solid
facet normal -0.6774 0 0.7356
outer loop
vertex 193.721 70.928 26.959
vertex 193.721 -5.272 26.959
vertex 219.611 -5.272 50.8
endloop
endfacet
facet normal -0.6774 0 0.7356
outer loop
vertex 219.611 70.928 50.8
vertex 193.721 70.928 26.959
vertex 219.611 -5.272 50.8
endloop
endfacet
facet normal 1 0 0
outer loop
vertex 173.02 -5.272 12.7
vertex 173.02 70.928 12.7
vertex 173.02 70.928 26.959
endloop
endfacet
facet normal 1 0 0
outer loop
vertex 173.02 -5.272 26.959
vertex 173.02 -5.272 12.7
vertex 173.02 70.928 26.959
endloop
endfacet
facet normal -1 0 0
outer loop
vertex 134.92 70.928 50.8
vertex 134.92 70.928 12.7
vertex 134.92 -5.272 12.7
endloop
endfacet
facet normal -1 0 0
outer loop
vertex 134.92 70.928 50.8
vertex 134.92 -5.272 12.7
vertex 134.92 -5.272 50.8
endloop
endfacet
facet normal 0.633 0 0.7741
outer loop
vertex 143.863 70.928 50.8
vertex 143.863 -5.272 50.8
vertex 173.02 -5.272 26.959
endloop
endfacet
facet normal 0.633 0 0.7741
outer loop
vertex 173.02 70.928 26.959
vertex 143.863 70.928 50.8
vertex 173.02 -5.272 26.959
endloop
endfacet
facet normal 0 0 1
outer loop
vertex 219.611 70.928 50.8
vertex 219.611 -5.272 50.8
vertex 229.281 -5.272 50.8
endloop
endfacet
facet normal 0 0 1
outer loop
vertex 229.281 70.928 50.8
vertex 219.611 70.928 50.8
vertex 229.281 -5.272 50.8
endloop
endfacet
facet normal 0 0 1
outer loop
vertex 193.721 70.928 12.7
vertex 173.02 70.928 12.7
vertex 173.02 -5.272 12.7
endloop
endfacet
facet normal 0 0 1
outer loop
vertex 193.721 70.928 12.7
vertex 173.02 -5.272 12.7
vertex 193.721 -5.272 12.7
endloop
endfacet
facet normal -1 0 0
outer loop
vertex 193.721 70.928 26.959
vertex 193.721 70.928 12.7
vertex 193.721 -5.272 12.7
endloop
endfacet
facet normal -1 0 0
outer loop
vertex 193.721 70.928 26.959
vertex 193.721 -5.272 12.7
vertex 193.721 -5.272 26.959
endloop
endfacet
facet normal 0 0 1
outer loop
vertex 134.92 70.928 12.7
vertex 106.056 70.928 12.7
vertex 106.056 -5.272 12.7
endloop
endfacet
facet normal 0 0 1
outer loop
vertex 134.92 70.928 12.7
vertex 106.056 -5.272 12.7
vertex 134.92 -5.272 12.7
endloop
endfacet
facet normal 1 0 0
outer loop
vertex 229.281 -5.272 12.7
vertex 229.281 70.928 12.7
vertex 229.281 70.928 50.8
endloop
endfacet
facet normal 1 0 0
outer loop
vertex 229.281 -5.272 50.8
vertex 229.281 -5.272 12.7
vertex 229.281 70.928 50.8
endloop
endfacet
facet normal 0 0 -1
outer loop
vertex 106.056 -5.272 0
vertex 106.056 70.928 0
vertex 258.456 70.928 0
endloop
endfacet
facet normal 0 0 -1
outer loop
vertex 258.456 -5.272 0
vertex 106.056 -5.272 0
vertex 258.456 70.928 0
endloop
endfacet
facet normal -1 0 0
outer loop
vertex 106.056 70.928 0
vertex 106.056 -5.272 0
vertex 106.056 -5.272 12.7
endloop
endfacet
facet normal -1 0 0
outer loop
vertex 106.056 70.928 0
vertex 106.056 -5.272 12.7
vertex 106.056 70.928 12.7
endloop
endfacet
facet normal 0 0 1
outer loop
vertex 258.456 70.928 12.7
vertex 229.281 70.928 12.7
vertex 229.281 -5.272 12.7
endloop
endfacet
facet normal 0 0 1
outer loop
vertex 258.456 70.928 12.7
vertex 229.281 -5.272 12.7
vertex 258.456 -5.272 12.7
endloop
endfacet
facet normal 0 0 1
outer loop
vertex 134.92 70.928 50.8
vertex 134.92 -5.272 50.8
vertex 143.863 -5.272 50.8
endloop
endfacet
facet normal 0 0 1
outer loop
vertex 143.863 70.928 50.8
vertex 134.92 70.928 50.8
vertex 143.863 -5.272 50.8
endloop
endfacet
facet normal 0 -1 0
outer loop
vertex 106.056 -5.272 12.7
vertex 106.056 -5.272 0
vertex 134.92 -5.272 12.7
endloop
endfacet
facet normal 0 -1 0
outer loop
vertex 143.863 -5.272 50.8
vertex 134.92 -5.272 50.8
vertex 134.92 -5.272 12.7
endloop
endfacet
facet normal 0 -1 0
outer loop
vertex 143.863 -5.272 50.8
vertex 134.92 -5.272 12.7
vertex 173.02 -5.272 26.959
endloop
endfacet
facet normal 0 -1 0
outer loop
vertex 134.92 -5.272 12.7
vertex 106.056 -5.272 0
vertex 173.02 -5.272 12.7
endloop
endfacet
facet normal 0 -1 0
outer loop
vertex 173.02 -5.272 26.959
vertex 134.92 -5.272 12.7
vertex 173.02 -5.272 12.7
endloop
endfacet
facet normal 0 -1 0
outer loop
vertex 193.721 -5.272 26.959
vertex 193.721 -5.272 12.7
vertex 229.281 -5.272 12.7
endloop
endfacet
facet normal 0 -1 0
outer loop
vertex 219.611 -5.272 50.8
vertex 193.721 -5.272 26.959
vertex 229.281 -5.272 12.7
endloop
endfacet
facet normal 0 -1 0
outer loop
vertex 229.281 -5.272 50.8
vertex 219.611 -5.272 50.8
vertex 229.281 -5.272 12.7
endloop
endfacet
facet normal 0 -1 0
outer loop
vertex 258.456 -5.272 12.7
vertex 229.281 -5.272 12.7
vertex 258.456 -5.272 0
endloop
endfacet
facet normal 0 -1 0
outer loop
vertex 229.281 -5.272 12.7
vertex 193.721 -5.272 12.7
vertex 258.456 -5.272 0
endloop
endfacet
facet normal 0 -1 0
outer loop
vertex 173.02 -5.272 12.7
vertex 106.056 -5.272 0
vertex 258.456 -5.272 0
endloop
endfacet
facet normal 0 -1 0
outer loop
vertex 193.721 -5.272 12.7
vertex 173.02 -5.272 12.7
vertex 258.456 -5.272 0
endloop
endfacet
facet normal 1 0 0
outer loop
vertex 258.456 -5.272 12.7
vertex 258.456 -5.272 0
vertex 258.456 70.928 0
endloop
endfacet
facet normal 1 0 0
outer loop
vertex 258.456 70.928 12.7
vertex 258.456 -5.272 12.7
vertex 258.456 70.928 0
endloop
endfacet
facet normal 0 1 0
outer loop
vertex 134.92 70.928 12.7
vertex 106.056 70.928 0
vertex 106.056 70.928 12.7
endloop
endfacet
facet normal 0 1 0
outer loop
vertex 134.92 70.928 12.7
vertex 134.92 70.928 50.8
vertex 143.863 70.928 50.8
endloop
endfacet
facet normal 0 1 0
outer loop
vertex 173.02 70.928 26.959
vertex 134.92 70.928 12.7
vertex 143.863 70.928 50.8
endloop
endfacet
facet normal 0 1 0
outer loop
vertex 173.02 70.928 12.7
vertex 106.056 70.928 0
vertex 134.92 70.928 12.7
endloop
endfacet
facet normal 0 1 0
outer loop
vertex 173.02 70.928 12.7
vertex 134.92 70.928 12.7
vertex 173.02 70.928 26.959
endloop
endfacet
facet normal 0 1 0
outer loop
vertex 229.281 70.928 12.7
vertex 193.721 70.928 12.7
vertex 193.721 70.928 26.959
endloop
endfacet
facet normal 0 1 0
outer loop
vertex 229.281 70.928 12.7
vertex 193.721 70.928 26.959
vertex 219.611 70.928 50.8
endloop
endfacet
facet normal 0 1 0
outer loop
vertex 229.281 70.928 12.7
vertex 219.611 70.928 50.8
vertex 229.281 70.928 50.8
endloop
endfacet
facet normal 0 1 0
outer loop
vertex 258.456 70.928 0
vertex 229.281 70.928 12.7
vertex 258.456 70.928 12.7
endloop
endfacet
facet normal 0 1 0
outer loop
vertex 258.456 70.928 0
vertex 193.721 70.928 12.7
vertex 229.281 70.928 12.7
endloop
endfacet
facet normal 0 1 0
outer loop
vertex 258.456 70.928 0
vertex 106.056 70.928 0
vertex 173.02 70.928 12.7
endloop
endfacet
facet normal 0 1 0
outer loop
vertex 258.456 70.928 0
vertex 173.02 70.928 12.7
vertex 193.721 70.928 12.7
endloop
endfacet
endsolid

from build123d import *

# Parameters (mm, degrees)
F0_W     = 152.4
F0_H     = 76.2
F1_DEPTH = 12.7
F2_W     = 38.1
F2_H     = 38.1
F3_DEPTH = 76.2
F4_W     = 35.56
F4_H     = 38.1
F5_DEPTH = 76.2
F7_DEPTH = 76.2
F9_DEPTH = 76.2


with BuildPart() as f1:
    # F0 (on Top) → F1 (new body)
    with BuildSketch(Plane.XY):
        with Locations((182.255961, 32.827802)):
            Rectangle(F0_W, F0_H)
    extrude(amount=F1_DEPTH)

    # F2 (on face) → F3 (join)
    with BuildSketch(Plane.XZ.offset(5.272198)):
        with Locations((153.970076, 31.75)):
            Rectangle(F2_W, F2_H)
    extrude(amount=-F3_DEPTH)

    # F4 (on face) → F5 (join)
    with BuildSketch(Plane.XZ.offset(5.272198)):
        with Locations((211.501011, 31.75)):
            Rectangle(F4_W, F4_H)
    extrude(amount=-F5_DEPTH)

    # F6 (on face) → F7 (cut)
    with BuildSketch(Plane.XZ.offset(5.272198)):
        Polygon((173.020076, 50.8), (143.86259, 50.8), (173.020076, 26.959093), align=None)
    extrude(amount=-F7_DEPTH, mode=Mode.SUBTRACT)

    # F8 (on face) → F9 (cut)
    with BuildSketch(Plane.XZ.offset(5.272198)):
        Polygon((193.721011, 26.959093), (219.611079, 50.8), (193.721011, 50.8), align=None)
    extrude(amount=-F9_DEPTH, mode=Mode.SUBTRACT)


solid = f1.part
